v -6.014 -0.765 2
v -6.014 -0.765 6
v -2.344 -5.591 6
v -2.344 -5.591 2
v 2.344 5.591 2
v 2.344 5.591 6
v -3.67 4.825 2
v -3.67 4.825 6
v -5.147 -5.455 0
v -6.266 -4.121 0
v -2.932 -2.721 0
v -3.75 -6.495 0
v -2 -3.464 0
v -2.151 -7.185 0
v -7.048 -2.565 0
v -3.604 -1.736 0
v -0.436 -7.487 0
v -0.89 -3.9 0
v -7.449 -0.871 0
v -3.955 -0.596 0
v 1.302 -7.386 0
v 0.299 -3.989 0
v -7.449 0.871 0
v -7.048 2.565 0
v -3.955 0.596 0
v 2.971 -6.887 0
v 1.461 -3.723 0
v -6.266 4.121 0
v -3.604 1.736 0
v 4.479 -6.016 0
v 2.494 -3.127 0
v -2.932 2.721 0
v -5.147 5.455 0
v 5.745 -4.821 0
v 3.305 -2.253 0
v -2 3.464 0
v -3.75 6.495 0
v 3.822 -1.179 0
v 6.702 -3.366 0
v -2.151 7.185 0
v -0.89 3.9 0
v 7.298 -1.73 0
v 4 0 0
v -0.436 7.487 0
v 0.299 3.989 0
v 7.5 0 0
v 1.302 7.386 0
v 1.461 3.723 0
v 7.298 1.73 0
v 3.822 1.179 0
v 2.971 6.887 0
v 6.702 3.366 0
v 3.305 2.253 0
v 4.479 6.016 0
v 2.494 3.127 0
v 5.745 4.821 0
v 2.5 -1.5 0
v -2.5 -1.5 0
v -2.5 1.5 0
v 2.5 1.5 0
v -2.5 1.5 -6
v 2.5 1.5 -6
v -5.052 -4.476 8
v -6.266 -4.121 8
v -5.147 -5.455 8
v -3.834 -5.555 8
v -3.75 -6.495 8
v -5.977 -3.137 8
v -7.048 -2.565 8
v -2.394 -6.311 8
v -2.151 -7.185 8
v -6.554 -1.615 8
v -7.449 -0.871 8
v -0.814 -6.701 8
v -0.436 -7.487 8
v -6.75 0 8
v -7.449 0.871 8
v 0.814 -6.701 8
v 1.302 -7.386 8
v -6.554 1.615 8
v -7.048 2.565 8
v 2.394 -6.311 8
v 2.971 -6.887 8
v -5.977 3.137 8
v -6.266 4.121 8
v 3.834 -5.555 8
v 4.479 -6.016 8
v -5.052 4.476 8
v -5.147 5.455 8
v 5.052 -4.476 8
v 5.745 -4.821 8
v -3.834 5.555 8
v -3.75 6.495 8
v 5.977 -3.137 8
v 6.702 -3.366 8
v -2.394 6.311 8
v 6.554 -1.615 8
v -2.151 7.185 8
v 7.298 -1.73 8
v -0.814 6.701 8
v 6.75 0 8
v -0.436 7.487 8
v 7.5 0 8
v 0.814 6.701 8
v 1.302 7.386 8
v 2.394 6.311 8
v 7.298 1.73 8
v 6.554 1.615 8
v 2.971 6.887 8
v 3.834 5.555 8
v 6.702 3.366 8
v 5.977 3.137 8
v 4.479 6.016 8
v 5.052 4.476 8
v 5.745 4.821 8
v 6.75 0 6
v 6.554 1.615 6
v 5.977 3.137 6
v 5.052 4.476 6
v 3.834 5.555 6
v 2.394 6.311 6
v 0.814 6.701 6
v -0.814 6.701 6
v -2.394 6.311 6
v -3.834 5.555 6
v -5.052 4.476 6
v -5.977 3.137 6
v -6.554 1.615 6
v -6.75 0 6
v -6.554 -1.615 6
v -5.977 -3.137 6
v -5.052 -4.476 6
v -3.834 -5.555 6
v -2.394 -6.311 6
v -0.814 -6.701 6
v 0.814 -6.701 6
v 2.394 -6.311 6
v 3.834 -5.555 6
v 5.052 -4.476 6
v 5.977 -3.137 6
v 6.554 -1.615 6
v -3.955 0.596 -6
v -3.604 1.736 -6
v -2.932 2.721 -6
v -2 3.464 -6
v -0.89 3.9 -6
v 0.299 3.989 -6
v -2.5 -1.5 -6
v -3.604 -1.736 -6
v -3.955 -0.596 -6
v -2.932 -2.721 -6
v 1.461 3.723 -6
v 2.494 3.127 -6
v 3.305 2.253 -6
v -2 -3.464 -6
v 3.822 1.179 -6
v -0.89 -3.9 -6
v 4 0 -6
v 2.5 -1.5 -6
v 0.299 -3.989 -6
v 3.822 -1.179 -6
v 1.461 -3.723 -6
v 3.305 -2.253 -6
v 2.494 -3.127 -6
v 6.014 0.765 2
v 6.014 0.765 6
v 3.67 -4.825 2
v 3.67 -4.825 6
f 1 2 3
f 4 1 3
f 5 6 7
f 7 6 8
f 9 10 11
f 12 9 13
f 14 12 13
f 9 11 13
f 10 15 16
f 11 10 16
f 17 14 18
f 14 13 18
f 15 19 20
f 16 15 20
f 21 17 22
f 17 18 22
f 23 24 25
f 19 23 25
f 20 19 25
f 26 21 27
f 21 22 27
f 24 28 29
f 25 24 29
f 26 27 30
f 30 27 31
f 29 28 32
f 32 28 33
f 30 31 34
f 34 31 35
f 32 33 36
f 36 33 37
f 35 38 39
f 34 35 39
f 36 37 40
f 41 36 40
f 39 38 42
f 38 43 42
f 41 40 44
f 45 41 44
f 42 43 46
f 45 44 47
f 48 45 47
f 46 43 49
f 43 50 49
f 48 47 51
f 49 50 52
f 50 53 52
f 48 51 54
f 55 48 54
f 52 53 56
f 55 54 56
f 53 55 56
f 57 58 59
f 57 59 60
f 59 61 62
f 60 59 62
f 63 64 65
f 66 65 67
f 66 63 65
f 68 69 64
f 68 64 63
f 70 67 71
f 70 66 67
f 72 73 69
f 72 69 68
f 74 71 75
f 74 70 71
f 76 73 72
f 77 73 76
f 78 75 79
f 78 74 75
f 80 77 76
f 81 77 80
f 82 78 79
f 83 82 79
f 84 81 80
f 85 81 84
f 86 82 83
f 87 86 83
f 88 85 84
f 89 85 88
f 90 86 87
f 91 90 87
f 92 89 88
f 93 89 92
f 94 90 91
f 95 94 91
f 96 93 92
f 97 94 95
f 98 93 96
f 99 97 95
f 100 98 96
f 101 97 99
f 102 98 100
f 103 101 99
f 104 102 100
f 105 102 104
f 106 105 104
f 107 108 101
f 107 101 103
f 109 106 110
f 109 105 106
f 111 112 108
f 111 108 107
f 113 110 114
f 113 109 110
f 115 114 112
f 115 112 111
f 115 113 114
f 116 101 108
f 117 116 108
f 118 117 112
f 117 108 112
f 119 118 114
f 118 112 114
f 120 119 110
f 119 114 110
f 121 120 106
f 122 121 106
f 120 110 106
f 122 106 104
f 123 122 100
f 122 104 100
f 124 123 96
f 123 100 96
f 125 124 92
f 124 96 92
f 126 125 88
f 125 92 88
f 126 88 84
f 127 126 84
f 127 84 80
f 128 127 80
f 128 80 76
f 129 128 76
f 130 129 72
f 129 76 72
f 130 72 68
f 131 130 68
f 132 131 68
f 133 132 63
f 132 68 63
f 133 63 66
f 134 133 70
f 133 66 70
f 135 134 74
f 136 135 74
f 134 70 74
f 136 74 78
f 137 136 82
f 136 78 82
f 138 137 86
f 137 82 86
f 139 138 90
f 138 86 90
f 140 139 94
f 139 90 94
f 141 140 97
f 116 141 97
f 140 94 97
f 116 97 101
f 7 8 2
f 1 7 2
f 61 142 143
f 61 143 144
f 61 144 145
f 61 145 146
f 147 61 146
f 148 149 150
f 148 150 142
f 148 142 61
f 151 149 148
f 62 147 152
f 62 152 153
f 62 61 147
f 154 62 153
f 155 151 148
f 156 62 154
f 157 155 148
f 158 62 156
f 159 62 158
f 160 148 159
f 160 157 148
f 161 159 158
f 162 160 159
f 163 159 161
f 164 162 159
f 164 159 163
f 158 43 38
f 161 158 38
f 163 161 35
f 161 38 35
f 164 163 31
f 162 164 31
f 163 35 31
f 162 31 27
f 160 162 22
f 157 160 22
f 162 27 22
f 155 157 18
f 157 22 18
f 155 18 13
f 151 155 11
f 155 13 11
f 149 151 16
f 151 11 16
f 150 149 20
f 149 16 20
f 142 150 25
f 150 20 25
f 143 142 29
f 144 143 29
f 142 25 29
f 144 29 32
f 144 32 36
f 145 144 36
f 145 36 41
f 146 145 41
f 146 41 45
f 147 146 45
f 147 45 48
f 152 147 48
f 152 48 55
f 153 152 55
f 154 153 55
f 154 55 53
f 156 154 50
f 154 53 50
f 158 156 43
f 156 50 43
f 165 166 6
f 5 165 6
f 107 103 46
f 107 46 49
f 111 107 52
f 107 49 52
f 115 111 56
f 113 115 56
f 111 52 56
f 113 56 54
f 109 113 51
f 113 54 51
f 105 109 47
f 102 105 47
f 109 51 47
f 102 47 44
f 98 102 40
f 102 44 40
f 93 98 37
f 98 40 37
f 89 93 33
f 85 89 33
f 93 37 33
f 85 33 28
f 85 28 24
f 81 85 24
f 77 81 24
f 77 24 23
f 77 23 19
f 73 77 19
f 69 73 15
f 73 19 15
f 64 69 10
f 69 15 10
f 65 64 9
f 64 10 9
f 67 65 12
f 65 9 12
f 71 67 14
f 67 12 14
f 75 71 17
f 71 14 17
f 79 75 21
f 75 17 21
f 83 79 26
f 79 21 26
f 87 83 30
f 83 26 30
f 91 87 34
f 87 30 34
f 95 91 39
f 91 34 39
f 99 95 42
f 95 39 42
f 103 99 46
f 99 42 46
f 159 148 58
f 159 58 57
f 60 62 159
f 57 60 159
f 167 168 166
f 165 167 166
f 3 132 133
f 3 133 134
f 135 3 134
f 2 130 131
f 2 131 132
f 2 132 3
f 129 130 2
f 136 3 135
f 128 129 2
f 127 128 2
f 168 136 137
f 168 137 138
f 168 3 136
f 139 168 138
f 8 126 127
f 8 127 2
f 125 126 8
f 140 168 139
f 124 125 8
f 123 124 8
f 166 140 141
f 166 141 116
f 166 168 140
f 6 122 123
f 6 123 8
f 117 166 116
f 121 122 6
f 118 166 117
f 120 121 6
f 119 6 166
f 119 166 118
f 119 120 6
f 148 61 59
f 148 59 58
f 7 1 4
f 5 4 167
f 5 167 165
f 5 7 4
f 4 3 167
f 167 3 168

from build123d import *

# Parameters (mm, degrees)
F0_R     = 7.5
F1_DEPTH = 8
F2_R     = 6.75
F3_DEPTH = 2
F5_DEPTH = 4
F6_R     = 4
F7_DEPTH = 6
F8_W     = 5
F8_H     = 3
F9_DEPTH = 6


with BuildPart() as f1:
    # F0 (on Top) → F1 (new body)
    with BuildSketch(Plane.XY):
        Circle(F0_R)
    extrude(amount=F1_DEPTH)

    # F2 (on face) → F3 (cut)
    with BuildSketch(Plane.XY.offset(8)):
        Circle(F2_R)
    extrude(amount=-F3_DEPTH, mode=Mode.SUBTRACT)

    # F4 (on face) → F5 (cut)
    with BuildSketch(Plane.XY.offset(6)):
        Polygon((6.013669, 0.765369), (2.344005, 5.590674), (-3.669664, 4.825305), (-6.013669, -0.765369), (-2.344005, -5.590674), (3.669664, -4.825305), align=None)
    extrude(amount=-F5_DEPTH, mode=Mode.SUBTRACT)

    # F6 (on face) → F7 (join)
    with BuildSketch(Plane(origin=(0, 0, 0), x_dir=(1, 0, 0), z_dir=(0, 0, -1))):
        Circle(F6_R)
    extrude(amount=F7_DEPTH)

    # F8 (on face) → F9 (cut)
    with BuildSketch(Plane(origin=(0, 0, -6), x_dir=(1, 0, 0), z_dir=(0, 0, -1))):
        Rectangle(F8_W, F8_H)
    extrude(amount=-F9_DEPTH, mode=Mode.SUBTRACT)


solid = f1.part
